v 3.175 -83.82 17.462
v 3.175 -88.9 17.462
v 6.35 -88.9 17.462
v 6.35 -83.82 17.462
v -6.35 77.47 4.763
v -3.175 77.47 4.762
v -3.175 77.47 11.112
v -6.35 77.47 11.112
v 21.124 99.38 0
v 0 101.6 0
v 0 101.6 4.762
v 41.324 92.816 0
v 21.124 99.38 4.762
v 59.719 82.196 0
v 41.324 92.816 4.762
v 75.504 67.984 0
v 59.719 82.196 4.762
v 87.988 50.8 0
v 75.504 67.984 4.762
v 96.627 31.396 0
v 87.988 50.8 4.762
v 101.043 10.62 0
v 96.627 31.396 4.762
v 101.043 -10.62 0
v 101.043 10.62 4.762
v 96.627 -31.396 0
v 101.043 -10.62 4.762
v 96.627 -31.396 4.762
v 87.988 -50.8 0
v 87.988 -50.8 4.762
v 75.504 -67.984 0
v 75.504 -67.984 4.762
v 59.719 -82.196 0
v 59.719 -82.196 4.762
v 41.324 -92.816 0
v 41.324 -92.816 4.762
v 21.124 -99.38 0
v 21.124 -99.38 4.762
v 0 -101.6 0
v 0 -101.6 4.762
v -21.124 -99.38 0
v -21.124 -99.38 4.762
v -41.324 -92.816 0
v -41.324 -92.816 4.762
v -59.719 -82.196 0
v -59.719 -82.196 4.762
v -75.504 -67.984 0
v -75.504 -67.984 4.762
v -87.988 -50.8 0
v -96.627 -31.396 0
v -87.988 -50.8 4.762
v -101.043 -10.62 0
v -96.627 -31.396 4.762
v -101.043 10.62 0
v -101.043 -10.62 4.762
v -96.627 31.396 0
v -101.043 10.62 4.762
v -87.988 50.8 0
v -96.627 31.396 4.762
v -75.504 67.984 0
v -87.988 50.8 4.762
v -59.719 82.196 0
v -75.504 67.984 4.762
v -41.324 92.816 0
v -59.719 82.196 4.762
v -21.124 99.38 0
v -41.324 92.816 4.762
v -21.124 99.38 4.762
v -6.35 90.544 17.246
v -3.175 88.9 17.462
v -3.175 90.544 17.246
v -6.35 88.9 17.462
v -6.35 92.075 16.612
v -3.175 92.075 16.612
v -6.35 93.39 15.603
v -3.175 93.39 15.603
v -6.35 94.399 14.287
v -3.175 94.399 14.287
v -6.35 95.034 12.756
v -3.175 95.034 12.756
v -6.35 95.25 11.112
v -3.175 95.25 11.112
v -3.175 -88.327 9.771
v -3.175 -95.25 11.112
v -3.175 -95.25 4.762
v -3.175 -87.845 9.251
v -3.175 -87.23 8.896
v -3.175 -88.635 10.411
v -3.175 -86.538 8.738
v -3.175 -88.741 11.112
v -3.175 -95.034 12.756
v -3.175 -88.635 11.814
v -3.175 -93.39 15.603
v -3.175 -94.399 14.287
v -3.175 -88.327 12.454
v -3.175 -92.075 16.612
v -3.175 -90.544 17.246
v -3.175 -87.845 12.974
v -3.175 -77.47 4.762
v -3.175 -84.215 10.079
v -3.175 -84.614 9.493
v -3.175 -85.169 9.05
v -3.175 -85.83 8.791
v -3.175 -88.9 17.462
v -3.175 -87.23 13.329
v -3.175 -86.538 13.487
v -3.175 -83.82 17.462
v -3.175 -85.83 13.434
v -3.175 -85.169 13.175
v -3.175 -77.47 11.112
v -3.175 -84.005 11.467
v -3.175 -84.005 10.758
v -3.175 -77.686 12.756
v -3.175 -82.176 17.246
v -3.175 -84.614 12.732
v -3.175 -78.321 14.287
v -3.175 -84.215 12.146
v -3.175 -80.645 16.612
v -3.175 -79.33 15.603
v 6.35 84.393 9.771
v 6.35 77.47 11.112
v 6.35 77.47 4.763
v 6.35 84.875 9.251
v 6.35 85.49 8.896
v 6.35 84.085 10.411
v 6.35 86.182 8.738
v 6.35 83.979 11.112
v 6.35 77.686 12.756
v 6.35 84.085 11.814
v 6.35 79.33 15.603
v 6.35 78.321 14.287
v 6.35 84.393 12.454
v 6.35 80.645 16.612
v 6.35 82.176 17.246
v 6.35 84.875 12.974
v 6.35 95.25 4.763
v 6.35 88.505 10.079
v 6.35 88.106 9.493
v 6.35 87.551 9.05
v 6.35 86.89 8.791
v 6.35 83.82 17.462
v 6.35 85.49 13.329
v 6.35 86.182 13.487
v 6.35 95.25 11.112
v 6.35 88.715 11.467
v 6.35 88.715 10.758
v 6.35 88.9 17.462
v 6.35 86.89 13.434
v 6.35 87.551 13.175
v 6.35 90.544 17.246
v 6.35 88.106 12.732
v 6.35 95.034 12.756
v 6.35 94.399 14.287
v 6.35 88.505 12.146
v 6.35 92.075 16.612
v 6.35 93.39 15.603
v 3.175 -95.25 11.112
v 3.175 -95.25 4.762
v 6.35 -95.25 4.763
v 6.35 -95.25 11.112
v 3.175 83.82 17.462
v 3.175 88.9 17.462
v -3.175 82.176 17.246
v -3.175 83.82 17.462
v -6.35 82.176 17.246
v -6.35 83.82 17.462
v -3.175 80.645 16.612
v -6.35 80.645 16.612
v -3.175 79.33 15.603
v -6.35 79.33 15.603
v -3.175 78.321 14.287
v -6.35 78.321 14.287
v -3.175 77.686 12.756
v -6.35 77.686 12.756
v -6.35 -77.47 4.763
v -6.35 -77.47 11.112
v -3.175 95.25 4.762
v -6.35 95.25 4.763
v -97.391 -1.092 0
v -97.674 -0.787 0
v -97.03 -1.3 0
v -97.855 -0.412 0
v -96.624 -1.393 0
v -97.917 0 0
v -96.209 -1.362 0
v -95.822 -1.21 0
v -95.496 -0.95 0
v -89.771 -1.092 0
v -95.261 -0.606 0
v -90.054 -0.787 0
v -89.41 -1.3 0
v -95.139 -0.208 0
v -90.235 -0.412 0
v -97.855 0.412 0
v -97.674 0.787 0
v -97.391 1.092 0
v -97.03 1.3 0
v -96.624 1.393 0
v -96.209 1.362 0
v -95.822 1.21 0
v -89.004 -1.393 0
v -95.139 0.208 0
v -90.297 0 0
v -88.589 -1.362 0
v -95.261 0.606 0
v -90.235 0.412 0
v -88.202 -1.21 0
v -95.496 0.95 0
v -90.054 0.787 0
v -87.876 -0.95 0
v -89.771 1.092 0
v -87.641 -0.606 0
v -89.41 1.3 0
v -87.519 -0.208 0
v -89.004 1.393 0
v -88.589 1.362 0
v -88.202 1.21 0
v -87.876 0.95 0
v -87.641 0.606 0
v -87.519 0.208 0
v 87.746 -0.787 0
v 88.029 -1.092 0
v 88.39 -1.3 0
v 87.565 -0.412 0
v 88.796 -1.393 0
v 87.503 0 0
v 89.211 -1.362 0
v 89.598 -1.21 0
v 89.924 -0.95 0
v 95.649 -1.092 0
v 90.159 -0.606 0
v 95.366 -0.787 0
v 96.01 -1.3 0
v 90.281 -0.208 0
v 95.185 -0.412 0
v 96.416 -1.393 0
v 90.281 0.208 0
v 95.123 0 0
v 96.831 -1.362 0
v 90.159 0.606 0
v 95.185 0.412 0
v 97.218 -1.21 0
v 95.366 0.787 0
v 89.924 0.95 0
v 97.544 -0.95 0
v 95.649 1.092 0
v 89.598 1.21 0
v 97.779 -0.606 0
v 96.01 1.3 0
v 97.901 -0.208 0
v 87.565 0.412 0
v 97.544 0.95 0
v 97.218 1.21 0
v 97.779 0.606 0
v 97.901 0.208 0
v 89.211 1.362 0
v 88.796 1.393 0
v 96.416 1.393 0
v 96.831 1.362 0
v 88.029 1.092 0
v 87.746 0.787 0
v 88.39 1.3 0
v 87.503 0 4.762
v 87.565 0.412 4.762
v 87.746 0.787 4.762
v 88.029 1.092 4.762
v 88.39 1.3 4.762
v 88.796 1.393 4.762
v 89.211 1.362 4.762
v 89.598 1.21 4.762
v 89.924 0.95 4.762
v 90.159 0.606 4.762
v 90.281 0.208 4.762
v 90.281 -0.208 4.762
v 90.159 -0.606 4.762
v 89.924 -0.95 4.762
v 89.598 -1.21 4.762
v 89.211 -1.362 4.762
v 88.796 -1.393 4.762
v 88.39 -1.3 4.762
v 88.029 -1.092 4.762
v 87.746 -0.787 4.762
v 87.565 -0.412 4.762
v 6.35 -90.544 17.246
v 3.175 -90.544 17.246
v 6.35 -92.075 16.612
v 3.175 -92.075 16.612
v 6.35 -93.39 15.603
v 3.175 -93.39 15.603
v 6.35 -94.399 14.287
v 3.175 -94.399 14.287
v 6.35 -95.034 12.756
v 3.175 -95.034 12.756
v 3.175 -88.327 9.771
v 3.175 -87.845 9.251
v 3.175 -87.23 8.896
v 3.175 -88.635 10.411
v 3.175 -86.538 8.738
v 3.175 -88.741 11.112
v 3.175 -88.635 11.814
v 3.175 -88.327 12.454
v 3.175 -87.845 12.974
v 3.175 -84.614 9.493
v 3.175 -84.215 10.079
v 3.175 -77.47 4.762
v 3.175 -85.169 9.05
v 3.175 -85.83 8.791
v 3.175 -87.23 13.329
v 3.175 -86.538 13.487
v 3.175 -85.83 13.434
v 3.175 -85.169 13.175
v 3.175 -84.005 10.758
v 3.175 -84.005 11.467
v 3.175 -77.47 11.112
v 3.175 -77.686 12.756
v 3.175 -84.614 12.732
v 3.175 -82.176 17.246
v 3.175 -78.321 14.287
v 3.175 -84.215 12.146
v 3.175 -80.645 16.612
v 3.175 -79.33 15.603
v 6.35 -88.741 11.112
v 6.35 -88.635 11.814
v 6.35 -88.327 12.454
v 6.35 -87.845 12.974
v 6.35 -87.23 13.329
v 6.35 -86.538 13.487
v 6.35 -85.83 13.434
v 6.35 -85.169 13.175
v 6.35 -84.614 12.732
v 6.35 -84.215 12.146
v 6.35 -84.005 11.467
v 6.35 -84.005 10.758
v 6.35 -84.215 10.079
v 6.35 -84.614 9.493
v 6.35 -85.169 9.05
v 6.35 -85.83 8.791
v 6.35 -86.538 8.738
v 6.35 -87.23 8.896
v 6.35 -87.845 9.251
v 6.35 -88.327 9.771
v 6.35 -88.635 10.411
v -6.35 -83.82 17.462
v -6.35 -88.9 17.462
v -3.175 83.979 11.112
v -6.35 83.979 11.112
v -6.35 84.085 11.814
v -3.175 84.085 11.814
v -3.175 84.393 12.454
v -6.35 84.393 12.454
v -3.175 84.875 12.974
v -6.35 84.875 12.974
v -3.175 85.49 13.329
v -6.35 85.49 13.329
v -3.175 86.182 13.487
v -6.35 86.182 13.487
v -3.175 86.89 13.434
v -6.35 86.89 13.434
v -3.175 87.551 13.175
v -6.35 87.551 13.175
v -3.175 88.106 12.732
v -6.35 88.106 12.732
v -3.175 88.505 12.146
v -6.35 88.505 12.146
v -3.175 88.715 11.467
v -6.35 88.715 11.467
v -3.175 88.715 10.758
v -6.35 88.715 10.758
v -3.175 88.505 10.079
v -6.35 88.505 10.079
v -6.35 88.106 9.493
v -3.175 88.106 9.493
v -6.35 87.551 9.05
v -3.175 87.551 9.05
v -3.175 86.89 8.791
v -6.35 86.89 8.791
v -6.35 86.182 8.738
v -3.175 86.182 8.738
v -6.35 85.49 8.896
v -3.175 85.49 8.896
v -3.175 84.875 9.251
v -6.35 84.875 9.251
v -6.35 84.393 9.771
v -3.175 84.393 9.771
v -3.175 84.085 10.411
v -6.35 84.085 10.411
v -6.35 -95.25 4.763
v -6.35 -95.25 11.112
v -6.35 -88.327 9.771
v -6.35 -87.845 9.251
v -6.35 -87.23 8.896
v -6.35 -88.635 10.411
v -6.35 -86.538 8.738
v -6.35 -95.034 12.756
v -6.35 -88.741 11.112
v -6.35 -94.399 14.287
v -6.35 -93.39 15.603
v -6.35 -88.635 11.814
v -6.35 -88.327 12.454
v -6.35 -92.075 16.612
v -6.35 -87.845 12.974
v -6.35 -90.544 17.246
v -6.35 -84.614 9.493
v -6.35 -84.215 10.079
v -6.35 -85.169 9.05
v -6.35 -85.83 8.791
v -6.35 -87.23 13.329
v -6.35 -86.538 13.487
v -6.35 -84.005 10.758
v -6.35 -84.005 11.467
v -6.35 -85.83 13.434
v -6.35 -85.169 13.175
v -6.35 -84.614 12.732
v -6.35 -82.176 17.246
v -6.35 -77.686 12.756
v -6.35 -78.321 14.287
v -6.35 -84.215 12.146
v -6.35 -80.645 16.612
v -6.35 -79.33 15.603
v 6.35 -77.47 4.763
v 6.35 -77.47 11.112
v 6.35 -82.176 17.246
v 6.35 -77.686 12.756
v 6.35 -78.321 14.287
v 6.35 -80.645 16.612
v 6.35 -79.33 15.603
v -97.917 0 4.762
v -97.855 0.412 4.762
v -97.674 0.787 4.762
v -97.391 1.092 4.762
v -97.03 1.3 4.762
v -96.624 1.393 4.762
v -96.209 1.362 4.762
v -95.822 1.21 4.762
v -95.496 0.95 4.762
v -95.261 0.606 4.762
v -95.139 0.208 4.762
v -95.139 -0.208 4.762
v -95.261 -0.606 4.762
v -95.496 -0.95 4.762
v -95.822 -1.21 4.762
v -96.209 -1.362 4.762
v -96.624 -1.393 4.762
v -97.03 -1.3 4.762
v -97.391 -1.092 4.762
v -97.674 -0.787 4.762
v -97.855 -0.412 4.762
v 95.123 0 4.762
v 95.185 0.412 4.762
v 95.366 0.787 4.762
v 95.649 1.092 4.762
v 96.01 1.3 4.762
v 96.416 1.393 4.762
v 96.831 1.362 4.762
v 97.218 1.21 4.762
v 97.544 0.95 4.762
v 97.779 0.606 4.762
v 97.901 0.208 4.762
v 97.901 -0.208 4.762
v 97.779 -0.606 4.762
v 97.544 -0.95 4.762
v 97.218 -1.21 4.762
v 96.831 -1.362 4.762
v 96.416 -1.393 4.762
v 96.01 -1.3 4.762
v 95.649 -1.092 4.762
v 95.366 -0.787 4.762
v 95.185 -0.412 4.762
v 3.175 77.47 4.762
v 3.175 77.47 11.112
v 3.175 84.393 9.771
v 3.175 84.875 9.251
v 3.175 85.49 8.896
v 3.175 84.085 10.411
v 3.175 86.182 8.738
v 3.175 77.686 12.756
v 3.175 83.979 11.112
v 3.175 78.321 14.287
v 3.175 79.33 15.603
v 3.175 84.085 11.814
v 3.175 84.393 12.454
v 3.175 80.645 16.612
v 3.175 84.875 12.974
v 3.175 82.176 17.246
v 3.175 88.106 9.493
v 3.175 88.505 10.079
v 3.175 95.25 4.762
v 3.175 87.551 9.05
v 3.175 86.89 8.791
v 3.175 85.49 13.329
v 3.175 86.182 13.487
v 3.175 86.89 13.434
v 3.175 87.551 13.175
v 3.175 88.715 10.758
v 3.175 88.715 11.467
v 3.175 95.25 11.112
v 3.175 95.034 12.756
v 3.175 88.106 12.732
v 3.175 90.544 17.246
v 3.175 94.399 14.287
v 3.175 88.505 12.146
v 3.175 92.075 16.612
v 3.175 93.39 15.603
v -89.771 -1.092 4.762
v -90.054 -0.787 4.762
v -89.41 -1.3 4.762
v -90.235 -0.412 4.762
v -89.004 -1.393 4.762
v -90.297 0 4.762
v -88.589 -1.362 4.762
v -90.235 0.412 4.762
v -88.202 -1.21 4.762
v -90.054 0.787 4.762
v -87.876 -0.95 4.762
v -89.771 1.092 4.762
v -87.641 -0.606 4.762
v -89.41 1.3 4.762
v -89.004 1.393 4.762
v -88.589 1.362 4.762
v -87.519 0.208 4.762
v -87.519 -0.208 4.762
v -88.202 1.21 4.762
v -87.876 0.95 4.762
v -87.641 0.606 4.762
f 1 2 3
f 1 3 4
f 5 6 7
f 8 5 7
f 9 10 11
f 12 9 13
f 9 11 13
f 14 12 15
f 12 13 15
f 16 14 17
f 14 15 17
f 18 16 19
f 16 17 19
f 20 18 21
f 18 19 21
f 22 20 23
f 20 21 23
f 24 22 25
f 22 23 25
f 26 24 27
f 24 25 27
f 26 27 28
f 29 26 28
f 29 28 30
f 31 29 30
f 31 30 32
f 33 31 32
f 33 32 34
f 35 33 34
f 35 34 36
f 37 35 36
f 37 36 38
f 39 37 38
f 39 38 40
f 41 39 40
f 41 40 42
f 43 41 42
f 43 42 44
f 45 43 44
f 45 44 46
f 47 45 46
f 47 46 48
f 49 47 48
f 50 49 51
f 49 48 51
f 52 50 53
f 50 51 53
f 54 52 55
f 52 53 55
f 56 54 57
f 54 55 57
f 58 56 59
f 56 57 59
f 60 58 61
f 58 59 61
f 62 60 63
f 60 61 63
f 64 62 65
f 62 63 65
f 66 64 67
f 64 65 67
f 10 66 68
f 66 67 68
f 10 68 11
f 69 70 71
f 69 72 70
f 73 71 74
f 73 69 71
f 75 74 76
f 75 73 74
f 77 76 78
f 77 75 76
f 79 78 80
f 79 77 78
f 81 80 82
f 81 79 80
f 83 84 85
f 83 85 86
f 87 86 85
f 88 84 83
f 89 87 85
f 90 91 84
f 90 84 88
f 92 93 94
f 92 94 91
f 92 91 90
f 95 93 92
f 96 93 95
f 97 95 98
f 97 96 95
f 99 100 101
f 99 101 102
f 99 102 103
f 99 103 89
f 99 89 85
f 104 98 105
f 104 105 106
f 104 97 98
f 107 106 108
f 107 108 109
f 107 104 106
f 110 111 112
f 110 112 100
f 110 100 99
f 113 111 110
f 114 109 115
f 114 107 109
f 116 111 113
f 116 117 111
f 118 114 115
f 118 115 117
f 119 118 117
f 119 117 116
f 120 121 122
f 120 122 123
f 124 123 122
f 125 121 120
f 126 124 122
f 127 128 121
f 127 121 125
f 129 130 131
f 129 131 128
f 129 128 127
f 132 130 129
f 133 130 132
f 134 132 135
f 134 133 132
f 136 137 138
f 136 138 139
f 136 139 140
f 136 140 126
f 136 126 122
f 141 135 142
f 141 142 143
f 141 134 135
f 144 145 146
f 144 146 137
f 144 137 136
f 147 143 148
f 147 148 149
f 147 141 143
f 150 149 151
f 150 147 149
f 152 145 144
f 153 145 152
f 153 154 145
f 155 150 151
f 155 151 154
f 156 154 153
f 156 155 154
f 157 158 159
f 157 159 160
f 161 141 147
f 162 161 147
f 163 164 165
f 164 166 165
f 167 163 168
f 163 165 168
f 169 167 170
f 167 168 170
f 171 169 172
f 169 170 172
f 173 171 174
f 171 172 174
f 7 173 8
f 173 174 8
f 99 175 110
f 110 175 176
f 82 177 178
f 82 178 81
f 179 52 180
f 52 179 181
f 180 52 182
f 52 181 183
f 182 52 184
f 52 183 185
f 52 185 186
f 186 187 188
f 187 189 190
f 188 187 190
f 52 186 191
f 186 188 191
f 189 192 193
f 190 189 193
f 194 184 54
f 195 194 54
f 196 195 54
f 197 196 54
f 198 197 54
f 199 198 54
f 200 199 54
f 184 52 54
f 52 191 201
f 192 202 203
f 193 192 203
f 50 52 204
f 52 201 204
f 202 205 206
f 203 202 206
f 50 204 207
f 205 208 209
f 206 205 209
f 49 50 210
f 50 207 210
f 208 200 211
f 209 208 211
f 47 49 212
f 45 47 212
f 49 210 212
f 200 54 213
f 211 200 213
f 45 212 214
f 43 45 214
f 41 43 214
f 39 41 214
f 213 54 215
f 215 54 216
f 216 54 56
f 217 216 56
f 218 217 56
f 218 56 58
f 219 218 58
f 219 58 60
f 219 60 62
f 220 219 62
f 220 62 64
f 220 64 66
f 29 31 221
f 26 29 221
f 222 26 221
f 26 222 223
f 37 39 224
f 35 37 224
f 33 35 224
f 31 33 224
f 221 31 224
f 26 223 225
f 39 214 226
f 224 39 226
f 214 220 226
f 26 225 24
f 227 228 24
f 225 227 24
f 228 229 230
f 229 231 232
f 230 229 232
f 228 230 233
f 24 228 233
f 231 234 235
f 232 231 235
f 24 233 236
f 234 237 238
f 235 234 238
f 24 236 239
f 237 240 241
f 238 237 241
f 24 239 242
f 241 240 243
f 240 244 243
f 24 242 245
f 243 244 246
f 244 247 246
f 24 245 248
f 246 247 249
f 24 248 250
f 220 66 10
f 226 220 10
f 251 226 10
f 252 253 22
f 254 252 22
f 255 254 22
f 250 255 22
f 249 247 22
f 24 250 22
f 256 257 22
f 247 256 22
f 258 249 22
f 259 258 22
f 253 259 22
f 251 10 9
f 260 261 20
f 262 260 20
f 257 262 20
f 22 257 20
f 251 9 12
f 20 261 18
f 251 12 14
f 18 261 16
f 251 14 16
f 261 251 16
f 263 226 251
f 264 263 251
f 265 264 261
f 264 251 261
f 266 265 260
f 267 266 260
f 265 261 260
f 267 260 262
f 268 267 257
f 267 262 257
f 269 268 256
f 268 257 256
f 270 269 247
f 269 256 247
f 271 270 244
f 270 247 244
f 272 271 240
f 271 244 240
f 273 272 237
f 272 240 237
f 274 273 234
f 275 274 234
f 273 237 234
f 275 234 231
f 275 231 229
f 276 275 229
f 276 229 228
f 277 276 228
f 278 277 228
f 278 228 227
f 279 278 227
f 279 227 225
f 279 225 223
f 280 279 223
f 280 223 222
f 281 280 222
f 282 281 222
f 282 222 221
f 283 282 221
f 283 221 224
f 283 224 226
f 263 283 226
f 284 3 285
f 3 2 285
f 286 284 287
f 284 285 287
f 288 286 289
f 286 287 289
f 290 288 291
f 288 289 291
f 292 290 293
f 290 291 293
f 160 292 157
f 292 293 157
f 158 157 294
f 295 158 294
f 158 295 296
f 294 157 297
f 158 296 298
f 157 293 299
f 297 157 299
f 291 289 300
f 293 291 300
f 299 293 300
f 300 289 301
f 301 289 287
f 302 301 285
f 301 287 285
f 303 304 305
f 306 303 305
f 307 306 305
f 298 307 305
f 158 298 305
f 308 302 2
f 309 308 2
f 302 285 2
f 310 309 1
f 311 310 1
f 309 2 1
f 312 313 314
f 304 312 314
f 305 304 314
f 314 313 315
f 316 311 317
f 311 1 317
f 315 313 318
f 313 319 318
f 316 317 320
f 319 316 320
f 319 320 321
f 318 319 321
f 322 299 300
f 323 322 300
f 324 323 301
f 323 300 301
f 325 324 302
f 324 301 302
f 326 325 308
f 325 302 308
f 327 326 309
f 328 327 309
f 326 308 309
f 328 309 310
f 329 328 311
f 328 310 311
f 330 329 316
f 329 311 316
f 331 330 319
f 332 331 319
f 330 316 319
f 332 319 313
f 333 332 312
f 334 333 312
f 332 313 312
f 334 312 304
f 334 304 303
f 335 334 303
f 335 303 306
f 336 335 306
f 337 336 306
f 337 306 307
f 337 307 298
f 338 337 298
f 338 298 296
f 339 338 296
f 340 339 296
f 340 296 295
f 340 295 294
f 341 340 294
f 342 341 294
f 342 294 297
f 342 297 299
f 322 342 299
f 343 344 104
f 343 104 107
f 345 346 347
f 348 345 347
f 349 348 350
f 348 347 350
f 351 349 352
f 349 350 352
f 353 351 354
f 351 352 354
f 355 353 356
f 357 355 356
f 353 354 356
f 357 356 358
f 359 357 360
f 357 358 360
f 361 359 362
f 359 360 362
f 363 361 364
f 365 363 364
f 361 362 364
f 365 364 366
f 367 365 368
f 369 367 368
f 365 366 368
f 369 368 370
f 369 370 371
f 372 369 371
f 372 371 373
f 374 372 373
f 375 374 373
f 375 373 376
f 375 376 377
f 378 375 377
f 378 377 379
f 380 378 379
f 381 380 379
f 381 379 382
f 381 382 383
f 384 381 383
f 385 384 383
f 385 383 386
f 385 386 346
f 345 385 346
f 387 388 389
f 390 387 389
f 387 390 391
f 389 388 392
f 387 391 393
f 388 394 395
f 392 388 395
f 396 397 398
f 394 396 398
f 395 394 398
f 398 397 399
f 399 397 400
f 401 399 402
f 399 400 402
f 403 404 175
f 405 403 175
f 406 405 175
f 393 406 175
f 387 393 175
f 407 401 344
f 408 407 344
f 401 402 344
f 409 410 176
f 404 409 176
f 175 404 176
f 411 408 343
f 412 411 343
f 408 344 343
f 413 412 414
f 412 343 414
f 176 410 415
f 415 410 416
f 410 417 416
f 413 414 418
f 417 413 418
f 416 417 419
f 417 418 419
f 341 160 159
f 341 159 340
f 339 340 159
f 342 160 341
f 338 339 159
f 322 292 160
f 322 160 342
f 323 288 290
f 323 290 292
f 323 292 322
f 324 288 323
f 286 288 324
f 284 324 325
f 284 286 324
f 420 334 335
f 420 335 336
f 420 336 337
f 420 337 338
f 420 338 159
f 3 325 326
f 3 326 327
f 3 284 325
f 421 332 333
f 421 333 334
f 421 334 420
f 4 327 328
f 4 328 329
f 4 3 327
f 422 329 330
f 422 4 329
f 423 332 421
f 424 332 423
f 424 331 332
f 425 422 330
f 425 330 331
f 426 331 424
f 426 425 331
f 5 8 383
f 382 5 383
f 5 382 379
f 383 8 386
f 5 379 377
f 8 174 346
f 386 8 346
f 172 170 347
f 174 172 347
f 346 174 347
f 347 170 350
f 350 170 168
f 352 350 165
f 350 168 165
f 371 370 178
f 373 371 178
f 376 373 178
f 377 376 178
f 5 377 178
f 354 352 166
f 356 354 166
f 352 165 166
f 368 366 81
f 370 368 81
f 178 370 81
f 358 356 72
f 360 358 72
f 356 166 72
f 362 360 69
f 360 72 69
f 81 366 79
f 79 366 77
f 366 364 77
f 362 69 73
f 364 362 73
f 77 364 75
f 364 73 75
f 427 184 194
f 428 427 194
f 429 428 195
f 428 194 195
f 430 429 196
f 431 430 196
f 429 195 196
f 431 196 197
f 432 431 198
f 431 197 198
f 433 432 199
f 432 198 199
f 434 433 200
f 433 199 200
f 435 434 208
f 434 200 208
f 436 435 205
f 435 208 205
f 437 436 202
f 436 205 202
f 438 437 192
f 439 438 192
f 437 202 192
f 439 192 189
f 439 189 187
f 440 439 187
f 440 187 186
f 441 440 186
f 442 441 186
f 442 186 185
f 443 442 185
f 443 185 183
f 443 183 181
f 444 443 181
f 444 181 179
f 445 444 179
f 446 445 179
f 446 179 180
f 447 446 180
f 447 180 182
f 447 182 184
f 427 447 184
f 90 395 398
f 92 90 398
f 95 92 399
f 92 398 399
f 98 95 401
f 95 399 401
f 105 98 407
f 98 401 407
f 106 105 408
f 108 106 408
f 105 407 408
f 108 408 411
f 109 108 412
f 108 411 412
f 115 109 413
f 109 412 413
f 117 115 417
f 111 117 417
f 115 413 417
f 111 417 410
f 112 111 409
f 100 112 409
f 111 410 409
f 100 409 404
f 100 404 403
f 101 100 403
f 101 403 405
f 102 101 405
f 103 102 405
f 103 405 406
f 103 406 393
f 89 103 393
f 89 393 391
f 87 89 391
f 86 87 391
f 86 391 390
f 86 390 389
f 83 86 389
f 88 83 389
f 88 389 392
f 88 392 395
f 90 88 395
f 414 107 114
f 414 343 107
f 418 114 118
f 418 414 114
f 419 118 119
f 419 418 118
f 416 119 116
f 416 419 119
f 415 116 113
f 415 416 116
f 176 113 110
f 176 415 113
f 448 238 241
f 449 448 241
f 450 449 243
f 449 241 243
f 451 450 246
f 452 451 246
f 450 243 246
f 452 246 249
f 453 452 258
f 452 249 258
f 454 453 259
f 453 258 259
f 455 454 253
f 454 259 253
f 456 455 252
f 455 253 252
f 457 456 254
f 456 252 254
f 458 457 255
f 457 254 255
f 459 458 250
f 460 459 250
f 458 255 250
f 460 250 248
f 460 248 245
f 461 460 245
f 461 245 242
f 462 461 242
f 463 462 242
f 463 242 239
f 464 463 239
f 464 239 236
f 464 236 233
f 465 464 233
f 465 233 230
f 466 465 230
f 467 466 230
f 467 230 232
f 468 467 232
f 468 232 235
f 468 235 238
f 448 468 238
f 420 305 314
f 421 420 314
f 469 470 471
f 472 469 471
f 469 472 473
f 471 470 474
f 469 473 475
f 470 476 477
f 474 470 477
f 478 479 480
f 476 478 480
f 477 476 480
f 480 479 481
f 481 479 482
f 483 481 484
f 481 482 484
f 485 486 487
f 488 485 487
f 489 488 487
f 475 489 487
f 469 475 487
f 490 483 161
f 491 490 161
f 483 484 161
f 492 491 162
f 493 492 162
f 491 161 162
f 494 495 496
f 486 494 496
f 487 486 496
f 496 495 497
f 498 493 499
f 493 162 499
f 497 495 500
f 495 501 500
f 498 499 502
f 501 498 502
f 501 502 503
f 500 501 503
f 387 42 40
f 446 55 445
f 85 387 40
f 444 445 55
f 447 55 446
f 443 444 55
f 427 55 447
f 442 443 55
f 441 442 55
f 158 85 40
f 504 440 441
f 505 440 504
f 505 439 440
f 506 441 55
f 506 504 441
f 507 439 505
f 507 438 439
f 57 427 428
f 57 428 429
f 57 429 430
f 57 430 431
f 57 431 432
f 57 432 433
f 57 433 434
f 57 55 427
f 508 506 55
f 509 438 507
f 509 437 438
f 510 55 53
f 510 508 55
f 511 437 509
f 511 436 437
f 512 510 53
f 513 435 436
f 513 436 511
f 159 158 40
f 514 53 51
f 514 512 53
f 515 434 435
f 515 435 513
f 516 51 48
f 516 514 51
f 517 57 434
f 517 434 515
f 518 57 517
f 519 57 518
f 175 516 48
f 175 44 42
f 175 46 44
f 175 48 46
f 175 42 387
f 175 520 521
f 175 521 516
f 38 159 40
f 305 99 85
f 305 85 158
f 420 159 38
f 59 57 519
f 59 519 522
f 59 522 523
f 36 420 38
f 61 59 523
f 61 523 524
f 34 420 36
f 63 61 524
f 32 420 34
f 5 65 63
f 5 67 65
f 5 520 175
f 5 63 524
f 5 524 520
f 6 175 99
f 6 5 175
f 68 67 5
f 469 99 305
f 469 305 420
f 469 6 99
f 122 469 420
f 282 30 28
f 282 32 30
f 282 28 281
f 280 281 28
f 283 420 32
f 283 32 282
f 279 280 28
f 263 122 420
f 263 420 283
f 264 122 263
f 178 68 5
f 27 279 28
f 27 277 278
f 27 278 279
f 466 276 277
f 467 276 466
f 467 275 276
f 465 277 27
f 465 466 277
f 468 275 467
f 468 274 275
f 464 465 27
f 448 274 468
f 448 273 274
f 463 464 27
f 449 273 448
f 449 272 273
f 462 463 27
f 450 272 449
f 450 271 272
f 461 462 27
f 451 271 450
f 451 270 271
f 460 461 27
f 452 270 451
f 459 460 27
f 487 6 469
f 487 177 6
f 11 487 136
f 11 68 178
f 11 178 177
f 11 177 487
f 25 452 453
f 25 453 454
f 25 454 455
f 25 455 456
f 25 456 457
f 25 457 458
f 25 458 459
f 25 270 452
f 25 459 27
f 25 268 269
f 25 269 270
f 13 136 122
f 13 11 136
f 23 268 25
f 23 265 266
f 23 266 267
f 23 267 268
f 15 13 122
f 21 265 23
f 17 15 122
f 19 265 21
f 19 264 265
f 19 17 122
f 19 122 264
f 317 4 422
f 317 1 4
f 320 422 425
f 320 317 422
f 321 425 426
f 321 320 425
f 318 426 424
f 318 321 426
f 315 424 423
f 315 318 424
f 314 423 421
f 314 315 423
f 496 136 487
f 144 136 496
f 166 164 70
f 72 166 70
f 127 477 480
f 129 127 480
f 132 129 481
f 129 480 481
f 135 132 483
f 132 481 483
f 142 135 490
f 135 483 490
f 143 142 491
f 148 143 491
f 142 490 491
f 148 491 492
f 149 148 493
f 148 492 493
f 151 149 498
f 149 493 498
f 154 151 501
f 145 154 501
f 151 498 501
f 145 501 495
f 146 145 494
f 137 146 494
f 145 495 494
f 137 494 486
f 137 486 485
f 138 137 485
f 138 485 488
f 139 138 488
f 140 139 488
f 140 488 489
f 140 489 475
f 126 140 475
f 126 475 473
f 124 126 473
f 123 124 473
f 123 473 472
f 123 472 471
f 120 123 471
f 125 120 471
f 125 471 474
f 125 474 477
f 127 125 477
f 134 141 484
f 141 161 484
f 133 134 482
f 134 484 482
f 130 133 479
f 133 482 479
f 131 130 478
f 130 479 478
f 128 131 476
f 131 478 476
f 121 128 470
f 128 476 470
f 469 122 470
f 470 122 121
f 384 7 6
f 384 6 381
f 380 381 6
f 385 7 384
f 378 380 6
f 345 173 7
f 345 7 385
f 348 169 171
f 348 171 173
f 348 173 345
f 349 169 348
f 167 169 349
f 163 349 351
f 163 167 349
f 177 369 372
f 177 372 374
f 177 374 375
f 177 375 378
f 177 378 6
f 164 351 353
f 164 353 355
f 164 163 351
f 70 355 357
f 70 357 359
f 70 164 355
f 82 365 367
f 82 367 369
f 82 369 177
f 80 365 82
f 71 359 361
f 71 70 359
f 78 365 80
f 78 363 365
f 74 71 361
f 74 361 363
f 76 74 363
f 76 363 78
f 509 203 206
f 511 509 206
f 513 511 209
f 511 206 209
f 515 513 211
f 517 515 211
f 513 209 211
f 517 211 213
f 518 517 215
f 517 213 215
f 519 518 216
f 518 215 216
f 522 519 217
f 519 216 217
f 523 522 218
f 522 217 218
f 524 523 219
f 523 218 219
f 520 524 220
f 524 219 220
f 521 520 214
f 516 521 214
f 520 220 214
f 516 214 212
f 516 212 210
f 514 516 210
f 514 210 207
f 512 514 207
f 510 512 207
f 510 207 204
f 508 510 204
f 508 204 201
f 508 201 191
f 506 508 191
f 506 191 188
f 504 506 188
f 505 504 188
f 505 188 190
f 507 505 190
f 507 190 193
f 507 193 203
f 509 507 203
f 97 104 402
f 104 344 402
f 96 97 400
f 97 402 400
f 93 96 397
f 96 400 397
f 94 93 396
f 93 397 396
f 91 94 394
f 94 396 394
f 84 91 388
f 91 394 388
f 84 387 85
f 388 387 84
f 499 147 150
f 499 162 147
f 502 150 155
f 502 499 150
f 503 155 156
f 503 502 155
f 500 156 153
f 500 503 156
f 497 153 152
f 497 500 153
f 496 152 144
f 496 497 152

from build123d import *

# Parameters (mm, degrees)
F0_W     = 203.2
F0_H     = 203.2
F1_DEPTH = 4.7625
F2_W     = 17.78
F2_H     = 12.7
F3_DEPTH = 6.35
F4_W     = 6.35
F4_H     = 17.78
F4_W_2   = 3.175
F5_DEPTH = 12.7
F7_D     = 4.7625
F9_DEPTH = 4.7635
F10_R    = 6.35
F12_D    = 2.794


with BuildPart() as f1:
    # F0 (on Top) → F1 (new body)
    with BuildSketch(Plane.XY):
        Rectangle(F0_W, F0_H)
    extrude(amount=F1_DEPTH)

    # F2 (on Right) → F3 (join, symmetric)
    with BuildSketch(Plane.YZ):
        with Locations((-86.36, 11.1125)):
            Rectangle(F2_W, F2_H)
        with Locations((86.36, 11.1125)):
            Rectangle(F2_W, F2_H)
    extrude(amount=F3_DEPTH, both=True)

    # F4 (on face) → F5 (cut, through all)
    with BuildSketch(Plane.XY.offset(17.4625)):
        with Locations((0, -86.36)):
            Rectangle(F4_W, F4_H)
        with Locations((-1.5875, 86.36)):
            Rectangle(F4_W_2, F4_H)
        with Locations((1.5875, 86.36)):
            Rectangle(F4_W_2, F4_H)
    extrude(amount=-F5_DEPTH, mode=Mode.SUBTRACT)

    # F7 (through all)
    with Locations(Plane.YZ.offset(6.35)):
        with Locations((-86.36, 11.1125), (86.36, 11.1125)):
            Hole(F7_D / 2)

    # F8 (on face) → F9 (cut, through all)
    with BuildSketch(Plane.XY.offset(4.7625)):
        with BuildLine():
            Line((-101.6, -101.6), (-3.53e-08, -101.6))
            ThreePointArc((-3.53e-08, -101.6), (-71.842048981, -71.8420489561), (-101.6, 0))
            Line((-101.6, 0), (-101.6, -101.6))
        make_face()
        with BuildLine():
            ThreePointArc((-101.6, 0), (-71.8420489199, 71.8420490172), (1.376e-07, 101.6))
            Line((1.376e-07, 101.6), (-101.6, 101.6))
            Line((-101.6, 101.6), (-101.6, 0))
        make_face()
        with BuildLine():
            ThreePointArc((1.376e-07, 101.6), (71.8420490172, 71.8420489199), (101.6, 0))
            Line((101.6, 0), (101.6, 101.6))
            Line((101.6, 101.6), (1.376e-07, 101.6))
        make_face()
        with BuildLine():
            Line((101.6, -101.6), (101.6, 0))
            ThreePointArc((101.6, 0), (71.8420489561, -71.842048981), (-3.53e-08, -101.6))
            Line((-3.53e-08, -101.6), (101.6, -101.6))
        make_face()
    extrude(amount=-F9_DEPTH, mode=Mode.SUBTRACT)

    # F10
    f10_edges = [f1.edges().sort_by_distance(p)[0] for p in [
        (-4.7625, -95.25, 17.4625),
        (-4.7625, -77.47, 17.4625),
        (-4.7625, 77.47, 17.4625),
        (-4.7625, 95.25, 17.4625),
        (4.7625, 95.25, 17.4625),
        (4.7625, 77.47, 17.4625),
        (4.7625, -95.25, 17.4625),
        (4.7625, -77.47, 17.4625),
    ]]
    fillet(f10_edges, radius=F10_R)

    # F12 (through all)
    with Locations(Plane.XY.offset(4.7625)):
        with Locations((-88.9, 0), (88.9, 0), (-96.52, 0), (96.52, 0)):
            Hole(F12_D / 2)


solid = f1.part
